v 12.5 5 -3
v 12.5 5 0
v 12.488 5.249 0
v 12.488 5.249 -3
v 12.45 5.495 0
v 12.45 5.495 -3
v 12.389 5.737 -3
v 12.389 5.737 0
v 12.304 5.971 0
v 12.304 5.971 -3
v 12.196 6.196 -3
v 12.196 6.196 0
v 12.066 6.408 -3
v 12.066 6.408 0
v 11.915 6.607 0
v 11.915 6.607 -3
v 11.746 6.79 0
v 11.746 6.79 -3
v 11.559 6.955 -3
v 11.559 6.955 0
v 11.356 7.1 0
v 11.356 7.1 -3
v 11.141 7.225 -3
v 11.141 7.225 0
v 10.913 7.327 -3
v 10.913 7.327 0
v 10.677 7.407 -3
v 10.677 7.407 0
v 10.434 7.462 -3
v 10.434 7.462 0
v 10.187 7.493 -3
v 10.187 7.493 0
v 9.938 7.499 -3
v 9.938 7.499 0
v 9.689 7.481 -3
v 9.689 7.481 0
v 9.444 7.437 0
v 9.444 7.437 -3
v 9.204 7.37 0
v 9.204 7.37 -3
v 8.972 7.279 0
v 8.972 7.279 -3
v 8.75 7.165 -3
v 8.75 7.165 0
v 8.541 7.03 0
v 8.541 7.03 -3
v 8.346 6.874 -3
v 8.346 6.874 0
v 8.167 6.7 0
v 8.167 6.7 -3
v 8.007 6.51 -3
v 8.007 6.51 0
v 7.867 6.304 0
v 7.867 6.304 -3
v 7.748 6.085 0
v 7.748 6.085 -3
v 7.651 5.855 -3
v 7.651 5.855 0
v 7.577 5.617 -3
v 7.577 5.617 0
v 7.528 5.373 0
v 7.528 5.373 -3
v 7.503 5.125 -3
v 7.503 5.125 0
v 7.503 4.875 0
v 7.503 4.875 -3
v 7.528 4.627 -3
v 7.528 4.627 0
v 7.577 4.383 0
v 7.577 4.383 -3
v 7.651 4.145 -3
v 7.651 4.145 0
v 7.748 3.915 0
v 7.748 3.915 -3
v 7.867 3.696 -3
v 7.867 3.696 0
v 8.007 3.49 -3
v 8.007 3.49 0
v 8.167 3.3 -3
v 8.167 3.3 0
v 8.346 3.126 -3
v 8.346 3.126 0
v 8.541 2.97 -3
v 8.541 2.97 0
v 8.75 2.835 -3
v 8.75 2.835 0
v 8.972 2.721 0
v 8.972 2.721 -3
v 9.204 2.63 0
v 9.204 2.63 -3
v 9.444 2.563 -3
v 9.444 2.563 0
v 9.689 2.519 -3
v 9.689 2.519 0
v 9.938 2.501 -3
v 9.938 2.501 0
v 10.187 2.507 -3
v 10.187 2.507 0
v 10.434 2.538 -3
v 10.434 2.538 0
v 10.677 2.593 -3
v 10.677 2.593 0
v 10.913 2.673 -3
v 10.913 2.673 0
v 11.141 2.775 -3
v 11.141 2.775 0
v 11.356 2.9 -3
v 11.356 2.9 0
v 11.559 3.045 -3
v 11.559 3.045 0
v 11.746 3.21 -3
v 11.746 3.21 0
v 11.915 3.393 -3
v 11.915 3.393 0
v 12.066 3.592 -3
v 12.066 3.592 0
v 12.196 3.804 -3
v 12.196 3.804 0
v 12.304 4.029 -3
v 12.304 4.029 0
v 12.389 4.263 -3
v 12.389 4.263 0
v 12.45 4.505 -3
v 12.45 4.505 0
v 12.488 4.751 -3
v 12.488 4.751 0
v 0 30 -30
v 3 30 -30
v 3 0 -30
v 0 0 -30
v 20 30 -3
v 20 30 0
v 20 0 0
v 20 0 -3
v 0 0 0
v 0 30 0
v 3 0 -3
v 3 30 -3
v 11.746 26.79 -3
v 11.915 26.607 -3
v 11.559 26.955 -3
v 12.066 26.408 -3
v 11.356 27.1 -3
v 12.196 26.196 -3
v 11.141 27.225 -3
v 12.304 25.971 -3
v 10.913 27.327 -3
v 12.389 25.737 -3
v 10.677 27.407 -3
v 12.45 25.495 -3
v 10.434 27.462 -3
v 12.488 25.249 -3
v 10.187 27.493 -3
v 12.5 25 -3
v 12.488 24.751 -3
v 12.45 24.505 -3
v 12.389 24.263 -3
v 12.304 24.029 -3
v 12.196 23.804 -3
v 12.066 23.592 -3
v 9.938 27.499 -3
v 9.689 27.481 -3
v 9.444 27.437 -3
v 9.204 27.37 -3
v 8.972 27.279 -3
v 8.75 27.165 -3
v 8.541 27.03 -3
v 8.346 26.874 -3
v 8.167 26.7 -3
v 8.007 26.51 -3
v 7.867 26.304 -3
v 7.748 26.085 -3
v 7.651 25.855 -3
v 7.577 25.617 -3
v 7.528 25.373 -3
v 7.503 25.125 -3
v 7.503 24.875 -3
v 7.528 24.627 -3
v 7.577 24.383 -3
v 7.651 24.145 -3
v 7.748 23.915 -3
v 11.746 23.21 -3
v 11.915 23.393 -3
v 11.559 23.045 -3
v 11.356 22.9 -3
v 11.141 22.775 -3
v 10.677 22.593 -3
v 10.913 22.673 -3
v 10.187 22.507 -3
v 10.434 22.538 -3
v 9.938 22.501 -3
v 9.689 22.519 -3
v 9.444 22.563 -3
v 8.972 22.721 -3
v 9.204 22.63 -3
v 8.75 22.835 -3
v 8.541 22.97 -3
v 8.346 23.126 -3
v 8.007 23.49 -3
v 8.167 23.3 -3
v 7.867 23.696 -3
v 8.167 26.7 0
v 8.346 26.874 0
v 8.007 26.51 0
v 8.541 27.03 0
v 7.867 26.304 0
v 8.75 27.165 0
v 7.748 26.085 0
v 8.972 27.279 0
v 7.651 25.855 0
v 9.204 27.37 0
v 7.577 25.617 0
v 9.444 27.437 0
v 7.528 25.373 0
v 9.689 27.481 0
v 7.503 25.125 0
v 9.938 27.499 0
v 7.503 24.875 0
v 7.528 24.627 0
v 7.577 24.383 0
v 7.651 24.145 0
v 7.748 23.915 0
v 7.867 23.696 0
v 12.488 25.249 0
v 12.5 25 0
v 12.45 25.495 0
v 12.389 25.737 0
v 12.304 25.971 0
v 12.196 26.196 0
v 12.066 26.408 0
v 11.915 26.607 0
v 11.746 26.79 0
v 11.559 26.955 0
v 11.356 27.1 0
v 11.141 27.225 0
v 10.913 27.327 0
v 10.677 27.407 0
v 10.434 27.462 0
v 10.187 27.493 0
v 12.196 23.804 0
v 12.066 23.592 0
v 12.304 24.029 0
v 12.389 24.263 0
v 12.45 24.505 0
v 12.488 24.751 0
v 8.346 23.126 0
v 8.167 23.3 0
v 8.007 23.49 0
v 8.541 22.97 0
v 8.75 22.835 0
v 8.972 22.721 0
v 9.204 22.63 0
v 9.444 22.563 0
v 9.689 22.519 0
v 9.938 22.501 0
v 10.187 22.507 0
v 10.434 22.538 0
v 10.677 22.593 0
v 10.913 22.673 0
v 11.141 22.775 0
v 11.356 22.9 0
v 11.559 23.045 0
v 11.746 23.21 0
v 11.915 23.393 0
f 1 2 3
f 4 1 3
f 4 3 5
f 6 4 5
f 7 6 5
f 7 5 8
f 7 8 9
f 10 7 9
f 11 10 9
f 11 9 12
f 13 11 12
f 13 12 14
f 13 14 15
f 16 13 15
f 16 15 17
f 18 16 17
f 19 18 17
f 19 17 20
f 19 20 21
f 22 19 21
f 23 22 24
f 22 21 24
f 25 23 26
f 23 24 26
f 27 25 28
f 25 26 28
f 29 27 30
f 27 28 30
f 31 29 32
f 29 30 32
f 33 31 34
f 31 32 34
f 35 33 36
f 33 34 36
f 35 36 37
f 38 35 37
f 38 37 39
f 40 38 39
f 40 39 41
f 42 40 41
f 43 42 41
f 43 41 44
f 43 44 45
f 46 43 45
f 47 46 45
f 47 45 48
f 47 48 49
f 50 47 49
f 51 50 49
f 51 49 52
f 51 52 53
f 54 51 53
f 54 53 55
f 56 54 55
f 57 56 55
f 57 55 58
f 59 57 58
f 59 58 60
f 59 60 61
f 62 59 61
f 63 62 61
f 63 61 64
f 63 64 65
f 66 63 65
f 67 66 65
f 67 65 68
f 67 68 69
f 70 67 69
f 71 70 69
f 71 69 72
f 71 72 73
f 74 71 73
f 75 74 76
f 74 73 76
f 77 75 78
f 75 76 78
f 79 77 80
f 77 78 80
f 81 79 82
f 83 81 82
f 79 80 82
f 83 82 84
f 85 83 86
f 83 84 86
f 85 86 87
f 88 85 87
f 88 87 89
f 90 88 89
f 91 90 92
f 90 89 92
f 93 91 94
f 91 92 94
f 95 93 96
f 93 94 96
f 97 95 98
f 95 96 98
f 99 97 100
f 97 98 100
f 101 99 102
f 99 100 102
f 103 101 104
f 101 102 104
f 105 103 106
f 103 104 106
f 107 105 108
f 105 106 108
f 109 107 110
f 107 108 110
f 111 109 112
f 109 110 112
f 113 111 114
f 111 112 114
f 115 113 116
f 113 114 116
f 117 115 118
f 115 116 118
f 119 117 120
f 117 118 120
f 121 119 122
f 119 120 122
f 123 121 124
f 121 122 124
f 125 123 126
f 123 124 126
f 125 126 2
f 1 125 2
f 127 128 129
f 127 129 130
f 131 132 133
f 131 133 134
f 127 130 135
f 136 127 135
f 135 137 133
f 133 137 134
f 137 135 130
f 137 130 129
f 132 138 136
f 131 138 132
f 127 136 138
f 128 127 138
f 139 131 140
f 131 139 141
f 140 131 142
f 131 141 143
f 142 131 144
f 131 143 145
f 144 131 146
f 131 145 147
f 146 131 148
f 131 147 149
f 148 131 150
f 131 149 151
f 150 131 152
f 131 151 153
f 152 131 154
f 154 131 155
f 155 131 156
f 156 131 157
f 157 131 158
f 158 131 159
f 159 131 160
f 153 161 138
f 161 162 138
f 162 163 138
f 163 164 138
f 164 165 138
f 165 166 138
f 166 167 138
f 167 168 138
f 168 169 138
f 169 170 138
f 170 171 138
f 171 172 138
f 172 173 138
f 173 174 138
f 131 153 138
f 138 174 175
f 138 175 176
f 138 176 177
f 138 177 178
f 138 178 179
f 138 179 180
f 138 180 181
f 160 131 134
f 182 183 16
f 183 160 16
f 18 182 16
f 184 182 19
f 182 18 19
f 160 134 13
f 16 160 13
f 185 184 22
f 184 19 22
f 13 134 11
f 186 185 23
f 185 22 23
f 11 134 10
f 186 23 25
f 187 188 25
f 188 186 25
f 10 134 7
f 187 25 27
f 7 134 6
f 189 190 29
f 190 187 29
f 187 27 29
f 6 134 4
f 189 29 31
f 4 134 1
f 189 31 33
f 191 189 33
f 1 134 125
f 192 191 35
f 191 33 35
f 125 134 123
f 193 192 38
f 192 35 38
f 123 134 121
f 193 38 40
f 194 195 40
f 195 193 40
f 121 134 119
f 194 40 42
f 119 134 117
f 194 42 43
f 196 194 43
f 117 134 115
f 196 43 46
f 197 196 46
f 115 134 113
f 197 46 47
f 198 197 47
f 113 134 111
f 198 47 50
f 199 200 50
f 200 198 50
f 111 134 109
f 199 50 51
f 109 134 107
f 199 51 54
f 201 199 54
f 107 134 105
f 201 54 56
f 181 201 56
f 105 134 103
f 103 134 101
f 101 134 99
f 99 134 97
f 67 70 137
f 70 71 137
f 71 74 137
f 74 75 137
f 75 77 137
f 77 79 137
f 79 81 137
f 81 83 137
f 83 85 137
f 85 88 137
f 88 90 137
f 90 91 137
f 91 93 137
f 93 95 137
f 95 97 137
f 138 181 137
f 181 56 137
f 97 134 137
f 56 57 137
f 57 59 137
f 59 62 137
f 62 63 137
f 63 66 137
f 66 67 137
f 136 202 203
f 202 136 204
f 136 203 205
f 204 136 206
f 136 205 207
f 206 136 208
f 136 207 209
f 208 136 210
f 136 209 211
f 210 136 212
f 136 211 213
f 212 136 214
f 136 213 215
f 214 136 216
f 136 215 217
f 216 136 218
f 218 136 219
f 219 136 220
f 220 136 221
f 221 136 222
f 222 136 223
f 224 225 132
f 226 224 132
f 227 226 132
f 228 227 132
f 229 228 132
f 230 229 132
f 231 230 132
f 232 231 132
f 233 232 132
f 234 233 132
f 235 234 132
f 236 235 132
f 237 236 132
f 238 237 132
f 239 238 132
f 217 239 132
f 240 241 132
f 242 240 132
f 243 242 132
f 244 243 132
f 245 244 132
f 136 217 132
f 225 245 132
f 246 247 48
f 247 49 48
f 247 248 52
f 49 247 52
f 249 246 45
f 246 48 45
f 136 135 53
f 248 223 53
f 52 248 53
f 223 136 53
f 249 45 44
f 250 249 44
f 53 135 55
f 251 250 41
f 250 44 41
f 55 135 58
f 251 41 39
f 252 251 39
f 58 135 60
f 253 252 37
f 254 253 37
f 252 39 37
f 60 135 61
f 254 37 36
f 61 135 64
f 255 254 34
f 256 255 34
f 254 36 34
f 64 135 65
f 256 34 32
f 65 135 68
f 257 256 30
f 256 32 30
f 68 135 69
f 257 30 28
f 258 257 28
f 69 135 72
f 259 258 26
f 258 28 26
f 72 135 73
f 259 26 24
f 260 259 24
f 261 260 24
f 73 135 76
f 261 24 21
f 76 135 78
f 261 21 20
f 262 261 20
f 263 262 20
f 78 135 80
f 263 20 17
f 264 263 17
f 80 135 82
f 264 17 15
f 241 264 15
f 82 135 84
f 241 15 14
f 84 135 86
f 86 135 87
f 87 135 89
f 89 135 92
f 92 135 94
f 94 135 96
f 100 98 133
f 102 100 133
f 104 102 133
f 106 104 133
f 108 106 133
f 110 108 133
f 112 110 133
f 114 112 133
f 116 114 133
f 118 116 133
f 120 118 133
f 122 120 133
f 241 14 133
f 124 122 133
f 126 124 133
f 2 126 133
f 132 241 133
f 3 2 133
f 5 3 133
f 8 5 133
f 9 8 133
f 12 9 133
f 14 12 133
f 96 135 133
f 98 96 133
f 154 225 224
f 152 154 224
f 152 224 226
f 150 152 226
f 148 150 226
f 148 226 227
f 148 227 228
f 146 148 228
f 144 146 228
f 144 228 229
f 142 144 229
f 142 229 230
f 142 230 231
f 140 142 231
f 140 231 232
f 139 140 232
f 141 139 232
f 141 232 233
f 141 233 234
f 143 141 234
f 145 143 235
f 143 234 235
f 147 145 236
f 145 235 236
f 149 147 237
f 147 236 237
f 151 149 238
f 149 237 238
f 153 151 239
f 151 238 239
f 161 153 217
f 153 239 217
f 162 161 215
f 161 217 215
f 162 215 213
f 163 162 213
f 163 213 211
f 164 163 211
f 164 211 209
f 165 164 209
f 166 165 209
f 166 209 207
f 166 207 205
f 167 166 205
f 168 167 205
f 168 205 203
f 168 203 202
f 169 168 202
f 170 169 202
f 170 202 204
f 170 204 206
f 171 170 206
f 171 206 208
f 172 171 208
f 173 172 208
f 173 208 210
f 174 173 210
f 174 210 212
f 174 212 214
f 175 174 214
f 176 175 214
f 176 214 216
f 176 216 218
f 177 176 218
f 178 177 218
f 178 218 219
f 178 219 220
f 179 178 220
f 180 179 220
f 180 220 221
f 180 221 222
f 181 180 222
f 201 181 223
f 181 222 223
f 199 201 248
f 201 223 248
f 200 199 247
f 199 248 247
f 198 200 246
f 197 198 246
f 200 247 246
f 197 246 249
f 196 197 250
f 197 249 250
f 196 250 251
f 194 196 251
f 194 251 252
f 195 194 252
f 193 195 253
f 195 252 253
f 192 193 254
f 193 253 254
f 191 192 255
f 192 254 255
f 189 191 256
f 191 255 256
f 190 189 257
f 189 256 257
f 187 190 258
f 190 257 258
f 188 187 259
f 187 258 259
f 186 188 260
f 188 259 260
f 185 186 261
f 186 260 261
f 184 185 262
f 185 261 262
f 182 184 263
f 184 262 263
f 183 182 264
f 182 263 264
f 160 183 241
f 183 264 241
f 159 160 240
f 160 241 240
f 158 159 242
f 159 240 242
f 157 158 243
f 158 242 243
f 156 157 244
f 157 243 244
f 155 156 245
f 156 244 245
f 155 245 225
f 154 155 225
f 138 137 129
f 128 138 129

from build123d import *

# Parameters (mm, degrees)
BOSS_EXTRUDE1_DEPTH = 30
SKETCH2_R           = 2.5
CUT_EXTRUDE1_DEPTH  = 31


with BuildPart() as part:
    # Sketch1 → Boss-Extrude1 (new body)
    with BuildSketch(Plane(origin=(0, 0, 0), x_dir=(1, 0, 0), z_dir=(0, 1, 0))):
        Polygon((0, 30), (0, 0), (20, 0), (20, 3), (3, 3), (3, 30), align=None)
    extrude(amount=BOSS_EXTRUDE1_DEPTH)

    # Sketch2 → Cut-Extrude1 (cut, through all)
    with BuildSketch(Plane.XY):
        with Locations((10, 25)):
            Circle(SKETCH2_R)
        with Locations((10, 5)):
            Circle(SKETCH2_R)
    extrude(amount=-CUT_EXTRUDE1_DEPTH, mode=Mode.SUBTRACT)


solid = part.part
